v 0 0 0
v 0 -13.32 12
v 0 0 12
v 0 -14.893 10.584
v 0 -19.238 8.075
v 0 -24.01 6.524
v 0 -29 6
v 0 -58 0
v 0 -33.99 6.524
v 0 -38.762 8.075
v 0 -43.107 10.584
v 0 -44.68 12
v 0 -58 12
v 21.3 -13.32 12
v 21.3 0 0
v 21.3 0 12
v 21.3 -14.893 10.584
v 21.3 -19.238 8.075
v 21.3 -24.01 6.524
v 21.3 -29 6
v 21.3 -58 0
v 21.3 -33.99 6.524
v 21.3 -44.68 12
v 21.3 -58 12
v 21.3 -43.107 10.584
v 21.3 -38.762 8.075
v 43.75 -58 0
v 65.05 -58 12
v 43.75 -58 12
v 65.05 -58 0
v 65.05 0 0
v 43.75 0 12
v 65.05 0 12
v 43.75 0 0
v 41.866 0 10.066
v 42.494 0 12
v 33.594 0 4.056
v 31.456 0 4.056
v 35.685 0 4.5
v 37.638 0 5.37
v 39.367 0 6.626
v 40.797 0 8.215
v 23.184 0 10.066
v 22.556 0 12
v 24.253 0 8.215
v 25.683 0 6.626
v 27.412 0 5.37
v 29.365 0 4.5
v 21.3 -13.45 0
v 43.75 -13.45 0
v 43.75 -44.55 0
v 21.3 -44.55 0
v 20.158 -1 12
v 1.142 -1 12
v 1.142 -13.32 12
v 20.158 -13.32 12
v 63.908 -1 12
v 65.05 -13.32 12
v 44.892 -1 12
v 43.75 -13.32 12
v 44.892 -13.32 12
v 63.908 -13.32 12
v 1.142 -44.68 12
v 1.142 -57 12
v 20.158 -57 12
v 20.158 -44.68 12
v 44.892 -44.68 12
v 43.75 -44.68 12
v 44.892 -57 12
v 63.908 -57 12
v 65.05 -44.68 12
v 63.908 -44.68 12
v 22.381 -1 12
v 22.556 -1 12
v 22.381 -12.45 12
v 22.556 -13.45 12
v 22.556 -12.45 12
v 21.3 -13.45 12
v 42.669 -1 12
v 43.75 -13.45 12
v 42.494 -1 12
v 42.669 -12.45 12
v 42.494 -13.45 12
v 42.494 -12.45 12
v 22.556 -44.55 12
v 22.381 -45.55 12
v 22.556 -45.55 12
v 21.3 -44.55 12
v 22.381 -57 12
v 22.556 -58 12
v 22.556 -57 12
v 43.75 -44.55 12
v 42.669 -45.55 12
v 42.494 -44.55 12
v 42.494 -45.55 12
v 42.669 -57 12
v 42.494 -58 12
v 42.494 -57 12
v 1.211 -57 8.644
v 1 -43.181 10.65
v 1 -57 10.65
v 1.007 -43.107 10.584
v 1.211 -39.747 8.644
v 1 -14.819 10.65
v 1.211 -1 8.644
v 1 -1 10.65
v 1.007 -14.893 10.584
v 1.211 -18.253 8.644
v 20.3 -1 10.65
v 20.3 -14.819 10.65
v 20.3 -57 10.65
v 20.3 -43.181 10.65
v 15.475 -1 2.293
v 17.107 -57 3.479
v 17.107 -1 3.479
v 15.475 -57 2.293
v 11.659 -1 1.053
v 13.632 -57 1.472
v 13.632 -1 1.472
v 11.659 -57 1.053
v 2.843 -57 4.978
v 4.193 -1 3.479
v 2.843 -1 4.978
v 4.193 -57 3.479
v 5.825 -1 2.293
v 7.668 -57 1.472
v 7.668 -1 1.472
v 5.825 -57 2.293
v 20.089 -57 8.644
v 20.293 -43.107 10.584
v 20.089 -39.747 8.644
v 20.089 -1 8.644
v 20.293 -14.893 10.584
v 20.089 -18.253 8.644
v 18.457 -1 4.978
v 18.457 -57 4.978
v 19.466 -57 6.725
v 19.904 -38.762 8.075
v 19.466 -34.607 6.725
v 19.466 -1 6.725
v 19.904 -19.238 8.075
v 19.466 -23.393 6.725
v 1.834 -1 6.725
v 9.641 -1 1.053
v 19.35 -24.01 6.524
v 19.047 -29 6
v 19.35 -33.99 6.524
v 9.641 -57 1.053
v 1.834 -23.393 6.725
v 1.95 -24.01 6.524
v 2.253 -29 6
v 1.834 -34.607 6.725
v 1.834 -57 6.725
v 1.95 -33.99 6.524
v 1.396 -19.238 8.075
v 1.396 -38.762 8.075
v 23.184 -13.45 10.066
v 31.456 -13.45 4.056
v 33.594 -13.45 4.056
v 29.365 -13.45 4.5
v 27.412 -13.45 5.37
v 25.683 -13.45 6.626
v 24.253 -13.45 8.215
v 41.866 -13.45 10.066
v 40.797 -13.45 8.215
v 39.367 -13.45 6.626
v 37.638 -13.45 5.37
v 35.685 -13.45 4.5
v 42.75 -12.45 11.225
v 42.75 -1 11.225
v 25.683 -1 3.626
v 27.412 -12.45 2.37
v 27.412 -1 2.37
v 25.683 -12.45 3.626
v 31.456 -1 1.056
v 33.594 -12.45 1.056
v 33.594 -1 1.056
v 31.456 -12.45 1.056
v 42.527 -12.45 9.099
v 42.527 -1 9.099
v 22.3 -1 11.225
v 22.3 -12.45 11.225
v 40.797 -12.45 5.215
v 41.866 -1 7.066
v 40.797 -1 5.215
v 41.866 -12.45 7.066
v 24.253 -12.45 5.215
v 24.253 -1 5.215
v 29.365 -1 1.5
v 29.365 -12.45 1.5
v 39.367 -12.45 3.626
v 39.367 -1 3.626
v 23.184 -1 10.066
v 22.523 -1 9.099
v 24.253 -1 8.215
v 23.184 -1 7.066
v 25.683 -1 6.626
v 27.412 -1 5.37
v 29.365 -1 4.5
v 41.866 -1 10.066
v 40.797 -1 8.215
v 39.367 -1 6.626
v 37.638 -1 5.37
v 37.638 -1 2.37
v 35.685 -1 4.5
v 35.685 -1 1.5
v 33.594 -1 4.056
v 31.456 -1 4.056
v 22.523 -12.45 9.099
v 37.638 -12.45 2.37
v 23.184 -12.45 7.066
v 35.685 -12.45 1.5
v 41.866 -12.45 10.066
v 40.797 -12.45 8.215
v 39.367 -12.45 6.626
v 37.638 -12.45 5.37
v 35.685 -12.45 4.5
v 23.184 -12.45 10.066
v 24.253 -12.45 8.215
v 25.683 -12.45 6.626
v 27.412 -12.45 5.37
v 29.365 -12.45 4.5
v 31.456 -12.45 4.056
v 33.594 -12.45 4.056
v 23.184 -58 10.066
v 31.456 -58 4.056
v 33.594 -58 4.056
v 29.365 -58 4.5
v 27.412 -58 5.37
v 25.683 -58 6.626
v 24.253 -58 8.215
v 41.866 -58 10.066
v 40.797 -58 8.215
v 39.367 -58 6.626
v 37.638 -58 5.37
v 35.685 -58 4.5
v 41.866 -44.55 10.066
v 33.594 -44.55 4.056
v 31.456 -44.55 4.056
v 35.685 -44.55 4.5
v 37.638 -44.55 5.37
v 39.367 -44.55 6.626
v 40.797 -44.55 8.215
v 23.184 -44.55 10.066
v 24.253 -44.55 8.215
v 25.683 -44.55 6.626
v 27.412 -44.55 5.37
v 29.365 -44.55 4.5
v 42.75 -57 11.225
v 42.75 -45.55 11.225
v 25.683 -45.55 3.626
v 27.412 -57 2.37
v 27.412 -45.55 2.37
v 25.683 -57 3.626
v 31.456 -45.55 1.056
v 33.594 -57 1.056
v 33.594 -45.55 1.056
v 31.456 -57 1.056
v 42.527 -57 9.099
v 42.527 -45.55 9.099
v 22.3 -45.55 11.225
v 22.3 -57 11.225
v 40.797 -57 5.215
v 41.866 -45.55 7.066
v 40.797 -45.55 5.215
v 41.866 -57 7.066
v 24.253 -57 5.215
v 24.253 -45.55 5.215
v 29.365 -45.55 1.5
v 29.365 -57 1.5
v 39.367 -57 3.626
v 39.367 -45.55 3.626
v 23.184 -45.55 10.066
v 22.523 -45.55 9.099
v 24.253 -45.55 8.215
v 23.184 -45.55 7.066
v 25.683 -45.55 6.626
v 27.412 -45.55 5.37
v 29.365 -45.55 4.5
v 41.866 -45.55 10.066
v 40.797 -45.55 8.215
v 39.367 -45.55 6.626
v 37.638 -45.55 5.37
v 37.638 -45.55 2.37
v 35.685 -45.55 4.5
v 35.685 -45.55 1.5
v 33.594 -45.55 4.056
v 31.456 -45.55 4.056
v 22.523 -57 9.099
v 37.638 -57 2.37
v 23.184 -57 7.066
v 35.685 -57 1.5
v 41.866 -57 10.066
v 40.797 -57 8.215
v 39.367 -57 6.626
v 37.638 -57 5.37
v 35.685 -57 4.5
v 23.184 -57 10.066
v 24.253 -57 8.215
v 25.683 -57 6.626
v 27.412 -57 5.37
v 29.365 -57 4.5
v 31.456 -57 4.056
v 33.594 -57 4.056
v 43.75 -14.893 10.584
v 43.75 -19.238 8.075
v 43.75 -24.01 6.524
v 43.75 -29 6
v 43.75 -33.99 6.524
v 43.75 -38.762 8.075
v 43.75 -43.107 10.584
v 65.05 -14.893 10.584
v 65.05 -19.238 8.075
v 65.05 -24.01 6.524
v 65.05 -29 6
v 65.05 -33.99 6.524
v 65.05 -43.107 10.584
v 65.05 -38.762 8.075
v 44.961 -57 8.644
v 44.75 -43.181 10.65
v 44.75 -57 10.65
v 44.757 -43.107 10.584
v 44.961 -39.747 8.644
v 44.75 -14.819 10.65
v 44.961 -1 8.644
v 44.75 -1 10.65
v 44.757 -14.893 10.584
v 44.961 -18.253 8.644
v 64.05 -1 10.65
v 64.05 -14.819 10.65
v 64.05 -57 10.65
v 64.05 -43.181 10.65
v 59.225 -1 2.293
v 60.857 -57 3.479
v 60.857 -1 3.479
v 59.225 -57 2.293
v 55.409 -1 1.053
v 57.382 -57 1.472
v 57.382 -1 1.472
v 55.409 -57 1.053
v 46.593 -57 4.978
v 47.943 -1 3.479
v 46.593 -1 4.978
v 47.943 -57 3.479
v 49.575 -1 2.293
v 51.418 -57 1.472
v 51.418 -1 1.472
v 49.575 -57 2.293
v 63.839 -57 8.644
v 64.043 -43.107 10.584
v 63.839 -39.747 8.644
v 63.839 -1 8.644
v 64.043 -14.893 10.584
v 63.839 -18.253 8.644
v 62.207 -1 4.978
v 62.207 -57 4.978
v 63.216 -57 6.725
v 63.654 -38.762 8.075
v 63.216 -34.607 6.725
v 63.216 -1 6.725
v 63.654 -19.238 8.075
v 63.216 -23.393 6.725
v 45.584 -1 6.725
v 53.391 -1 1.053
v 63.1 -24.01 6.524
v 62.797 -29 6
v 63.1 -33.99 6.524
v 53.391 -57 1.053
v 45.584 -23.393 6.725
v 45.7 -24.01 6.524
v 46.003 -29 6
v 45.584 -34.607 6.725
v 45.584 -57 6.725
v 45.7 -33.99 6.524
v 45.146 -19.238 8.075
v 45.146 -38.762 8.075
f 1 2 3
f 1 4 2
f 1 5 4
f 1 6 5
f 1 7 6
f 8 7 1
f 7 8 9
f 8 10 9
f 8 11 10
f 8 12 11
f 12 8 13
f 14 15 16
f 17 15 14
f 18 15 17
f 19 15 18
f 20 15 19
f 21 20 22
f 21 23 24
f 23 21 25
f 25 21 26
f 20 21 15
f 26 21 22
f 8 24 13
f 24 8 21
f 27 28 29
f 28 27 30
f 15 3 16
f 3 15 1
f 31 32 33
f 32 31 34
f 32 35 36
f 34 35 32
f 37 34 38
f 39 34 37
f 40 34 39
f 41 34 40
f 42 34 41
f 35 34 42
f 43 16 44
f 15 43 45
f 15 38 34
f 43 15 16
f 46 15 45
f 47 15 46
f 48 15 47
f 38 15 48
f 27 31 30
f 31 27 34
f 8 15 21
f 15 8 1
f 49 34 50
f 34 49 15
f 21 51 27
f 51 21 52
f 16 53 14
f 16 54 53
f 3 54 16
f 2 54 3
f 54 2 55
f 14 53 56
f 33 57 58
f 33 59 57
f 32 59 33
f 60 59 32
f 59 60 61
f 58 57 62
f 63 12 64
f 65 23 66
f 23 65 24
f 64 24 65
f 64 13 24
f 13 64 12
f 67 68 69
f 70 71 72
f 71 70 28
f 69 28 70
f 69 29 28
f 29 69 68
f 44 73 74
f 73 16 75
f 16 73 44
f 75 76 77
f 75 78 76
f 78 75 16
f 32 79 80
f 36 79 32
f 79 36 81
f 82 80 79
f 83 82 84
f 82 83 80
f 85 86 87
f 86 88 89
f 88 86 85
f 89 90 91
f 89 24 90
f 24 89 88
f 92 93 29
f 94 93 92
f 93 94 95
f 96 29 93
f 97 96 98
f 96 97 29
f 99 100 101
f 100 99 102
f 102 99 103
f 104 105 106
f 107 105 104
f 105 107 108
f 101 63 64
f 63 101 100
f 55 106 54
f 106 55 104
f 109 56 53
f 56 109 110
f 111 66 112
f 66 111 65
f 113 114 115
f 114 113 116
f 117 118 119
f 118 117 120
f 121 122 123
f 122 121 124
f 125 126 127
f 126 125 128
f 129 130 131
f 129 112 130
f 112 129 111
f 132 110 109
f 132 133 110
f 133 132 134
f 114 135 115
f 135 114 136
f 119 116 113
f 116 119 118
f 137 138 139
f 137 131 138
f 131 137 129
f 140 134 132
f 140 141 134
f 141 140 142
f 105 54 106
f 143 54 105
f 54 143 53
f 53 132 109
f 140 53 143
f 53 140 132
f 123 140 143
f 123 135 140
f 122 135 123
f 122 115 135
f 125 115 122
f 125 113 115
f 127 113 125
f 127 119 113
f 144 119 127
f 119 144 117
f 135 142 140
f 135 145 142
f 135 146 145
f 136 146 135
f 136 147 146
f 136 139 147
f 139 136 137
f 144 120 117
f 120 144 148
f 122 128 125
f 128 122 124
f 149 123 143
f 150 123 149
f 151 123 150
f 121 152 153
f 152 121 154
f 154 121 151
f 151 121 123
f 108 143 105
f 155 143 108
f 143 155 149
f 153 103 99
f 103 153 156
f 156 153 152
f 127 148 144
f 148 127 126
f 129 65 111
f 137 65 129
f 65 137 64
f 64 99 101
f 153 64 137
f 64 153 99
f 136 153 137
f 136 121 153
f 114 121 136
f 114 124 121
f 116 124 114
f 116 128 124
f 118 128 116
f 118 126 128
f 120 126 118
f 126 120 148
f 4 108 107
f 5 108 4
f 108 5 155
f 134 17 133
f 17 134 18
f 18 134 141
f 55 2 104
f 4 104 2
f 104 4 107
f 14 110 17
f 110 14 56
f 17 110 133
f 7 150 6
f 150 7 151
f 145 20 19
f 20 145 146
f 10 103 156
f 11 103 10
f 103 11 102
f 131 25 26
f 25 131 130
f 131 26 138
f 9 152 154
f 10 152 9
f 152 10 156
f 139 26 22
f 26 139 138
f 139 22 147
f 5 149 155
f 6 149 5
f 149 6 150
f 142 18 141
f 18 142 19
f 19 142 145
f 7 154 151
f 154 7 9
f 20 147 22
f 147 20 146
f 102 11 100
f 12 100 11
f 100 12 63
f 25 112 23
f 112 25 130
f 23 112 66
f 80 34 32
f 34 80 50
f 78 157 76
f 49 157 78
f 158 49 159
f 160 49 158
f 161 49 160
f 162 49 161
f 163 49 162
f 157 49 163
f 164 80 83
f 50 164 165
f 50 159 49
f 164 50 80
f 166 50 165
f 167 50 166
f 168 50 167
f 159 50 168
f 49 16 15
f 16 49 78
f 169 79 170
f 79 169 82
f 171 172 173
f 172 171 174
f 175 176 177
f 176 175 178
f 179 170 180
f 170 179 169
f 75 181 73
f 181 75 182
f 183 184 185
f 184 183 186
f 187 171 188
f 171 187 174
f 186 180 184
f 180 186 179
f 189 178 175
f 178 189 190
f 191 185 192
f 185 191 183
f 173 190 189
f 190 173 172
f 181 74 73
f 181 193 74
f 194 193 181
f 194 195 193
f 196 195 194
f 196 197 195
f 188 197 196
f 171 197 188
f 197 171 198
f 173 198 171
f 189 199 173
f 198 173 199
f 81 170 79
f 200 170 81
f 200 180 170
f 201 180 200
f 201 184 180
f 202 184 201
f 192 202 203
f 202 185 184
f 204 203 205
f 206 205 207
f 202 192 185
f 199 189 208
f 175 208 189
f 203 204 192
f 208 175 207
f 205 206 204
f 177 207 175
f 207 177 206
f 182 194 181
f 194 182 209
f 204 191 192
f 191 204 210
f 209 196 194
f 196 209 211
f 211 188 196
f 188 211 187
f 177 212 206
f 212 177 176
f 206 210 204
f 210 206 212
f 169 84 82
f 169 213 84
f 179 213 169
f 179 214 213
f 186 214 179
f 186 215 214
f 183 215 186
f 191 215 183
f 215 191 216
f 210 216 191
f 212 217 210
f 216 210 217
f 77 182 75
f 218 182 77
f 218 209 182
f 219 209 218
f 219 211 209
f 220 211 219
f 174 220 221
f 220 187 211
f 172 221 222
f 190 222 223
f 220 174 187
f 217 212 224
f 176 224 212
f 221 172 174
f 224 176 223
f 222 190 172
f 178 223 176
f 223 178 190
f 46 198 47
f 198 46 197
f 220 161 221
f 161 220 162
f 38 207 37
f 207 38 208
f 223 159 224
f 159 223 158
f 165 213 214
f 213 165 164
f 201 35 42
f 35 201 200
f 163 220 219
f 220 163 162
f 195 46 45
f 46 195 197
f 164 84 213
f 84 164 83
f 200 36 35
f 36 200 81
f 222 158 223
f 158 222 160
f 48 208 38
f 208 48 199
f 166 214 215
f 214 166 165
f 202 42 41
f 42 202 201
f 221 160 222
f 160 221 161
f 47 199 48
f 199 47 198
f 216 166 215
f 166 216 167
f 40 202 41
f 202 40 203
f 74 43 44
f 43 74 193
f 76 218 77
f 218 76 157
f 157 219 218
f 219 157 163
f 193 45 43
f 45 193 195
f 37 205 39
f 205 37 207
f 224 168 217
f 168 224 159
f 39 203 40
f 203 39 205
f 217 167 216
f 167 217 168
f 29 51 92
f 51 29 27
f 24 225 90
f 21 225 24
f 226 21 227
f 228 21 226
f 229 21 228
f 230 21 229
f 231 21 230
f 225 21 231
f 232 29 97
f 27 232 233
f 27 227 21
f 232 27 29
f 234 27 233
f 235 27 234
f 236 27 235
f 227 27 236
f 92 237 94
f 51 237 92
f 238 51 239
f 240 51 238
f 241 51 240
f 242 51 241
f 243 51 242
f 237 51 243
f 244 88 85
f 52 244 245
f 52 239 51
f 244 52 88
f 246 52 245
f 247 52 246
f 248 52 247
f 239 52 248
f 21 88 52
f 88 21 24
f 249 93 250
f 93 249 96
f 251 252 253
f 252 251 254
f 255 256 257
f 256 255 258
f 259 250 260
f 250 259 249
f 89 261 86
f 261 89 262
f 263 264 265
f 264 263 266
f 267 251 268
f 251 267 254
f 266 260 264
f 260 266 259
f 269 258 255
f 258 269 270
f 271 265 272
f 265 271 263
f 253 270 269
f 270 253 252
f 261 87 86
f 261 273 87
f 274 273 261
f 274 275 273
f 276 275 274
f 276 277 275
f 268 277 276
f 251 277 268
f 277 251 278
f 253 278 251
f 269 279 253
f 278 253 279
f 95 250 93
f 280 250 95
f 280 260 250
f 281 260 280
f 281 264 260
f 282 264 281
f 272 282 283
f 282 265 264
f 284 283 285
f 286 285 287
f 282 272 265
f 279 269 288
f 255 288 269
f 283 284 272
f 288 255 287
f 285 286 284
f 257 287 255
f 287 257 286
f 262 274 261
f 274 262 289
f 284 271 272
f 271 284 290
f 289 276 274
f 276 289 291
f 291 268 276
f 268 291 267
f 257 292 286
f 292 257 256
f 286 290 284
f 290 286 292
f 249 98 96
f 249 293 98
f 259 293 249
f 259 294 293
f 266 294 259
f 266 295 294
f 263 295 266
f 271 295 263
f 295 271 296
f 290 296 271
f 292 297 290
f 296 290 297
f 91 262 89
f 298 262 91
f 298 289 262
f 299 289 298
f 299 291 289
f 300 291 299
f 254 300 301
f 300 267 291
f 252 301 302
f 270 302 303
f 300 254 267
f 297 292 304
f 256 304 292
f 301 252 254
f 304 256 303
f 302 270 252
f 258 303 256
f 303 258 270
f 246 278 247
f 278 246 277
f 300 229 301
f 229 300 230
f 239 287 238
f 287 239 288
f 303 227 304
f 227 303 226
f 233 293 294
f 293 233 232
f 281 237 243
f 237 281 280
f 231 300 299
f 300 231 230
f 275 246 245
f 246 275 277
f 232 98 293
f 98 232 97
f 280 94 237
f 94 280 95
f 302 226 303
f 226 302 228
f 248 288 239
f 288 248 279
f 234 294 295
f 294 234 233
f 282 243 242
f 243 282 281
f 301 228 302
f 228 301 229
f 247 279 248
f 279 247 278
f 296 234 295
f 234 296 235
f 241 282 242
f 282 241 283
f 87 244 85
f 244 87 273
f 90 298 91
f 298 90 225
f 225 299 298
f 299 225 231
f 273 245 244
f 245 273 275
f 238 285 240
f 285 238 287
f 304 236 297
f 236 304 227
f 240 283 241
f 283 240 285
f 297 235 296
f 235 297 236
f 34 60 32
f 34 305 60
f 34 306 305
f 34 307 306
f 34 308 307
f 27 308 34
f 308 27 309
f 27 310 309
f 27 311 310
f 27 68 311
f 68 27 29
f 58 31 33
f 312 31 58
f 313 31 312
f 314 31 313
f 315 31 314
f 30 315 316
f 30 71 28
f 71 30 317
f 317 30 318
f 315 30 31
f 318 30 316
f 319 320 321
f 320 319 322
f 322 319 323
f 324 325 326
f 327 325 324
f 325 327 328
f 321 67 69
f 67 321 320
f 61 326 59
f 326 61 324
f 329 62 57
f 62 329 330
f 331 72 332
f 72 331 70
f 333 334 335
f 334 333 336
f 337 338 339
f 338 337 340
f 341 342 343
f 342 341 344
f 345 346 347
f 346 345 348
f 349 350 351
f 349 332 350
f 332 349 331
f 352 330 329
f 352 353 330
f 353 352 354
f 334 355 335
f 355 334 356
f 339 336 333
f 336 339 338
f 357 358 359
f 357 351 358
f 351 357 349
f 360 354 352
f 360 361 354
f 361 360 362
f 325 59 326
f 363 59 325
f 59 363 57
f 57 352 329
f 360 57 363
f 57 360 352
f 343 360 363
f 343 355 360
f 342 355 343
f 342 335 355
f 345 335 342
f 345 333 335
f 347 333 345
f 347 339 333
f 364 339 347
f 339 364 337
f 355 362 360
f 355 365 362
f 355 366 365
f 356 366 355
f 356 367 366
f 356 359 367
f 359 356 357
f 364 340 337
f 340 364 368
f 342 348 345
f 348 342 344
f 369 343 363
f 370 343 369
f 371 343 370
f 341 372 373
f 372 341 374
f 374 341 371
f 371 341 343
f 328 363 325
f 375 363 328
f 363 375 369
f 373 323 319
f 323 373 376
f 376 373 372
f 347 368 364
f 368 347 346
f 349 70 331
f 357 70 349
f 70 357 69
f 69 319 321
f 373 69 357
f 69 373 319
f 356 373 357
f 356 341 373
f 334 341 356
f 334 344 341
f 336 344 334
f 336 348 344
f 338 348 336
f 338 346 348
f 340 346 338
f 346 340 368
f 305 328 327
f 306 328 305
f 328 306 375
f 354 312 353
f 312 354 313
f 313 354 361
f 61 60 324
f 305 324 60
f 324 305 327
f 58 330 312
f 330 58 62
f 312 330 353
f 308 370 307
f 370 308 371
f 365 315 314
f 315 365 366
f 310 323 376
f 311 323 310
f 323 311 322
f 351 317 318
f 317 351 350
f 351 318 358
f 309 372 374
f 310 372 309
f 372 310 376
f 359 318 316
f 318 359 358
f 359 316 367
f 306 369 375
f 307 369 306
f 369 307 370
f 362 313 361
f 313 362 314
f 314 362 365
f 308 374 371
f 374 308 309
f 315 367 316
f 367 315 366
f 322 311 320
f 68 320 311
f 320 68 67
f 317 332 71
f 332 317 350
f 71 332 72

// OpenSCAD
// lower bobbin threads
module lowerSpool(x, y, wallThick, boxHeight) {
    spoolDiam = 20.45;
    spoolRad = spoolDiam / 2;
    spoolHeight = 11.45;
    doubleWall = wallThick * 2;
    
    translate([x, y, 0]) {
        rotate([90, 0, 0]) {
            difference() {
                // the holding box
                cube([spoolDiam + doubleWall, boxHeight, spoolHeight + doubleWall]);
                // cutout for the thread
                translate([spoolDiam / 2 + wallThick, spoolDiam / 2 + wallThick, wallThick]) {
                    cylinder(spoolHeight, r=spoolRad);
                }
                // finger grab cutouts
                translate([spoolDiam / 2 + wallThick, spoolDiam / 2 + wallThick * 4, 0]) {
                    cylinder(spoolHeight + doubleWall, r=spoolRad);
                }
            }
        }   
    }
}

// thin but long spool of thread
module normalSpool(x, y, wallThick, boxHeight) {
    spoolDiam = 19.3;
    spoolRad = spoolDiam / 2;
    spoolHeight = 56;
    doubleWall = wallThick * 2;
    
    translate([x, y, 0]) {
        difference() {
            // the holding box
            rotate([90, 0, 0]) {
                cube([spoolDiam + doubleWall, boxHeight, spoolHeight + doubleWall]);
            }
            // cutout for the thread
            rotate([90, 0, 0]) {
                translate([spoolDiam / 2 + wallThick, spoolDiam / 2 + wallThick, wallThick]) {
                    cylinder(spoolHeight, r=spoolRad);
                }
            }
            // finger grab cutouts
            translate([-spoolRad, -spoolHeight/2 - wallThick, 30]) {
                    rotate([0, 90, 0]) {
                        cylinder((spoolRad + doubleWall) * 3, r = 24);
                    }
                }
        }  
    } 
}

wallThickness = 1;
boxHeight = 12;

thinThreadWidth = 19.3;
thinThreadHeight = 56;
lowerBobbinWidth = 20.45;
totalWidth = 2 * thinThreadWidth + lowerBobbinWidth + 6 * wallThickness;
totalHeight = thinThreadHeight + 2 * wallThickness;

intersection() {
   
    translate([0, -totalHeight, 0]) {
        cube([totalWidth, totalHeight, boxHeight]);
    }

    union() {
        normalSpool(0, 0, wallThickness, boxHeight);
        translate([19.3+wallThickness*2, 0 , 0]) {
            lowerSpool(0, 0 , wallThickness, boxHeight);
            
                translate([0, -56  + 11.45 , 0]) {
                    lowerSpool(0, 0 , wallThickness, boxHeight);
            }
        }
        normalSpool(19.3+20.45+4, 0, wallThickness, boxHeight);
    }
}
